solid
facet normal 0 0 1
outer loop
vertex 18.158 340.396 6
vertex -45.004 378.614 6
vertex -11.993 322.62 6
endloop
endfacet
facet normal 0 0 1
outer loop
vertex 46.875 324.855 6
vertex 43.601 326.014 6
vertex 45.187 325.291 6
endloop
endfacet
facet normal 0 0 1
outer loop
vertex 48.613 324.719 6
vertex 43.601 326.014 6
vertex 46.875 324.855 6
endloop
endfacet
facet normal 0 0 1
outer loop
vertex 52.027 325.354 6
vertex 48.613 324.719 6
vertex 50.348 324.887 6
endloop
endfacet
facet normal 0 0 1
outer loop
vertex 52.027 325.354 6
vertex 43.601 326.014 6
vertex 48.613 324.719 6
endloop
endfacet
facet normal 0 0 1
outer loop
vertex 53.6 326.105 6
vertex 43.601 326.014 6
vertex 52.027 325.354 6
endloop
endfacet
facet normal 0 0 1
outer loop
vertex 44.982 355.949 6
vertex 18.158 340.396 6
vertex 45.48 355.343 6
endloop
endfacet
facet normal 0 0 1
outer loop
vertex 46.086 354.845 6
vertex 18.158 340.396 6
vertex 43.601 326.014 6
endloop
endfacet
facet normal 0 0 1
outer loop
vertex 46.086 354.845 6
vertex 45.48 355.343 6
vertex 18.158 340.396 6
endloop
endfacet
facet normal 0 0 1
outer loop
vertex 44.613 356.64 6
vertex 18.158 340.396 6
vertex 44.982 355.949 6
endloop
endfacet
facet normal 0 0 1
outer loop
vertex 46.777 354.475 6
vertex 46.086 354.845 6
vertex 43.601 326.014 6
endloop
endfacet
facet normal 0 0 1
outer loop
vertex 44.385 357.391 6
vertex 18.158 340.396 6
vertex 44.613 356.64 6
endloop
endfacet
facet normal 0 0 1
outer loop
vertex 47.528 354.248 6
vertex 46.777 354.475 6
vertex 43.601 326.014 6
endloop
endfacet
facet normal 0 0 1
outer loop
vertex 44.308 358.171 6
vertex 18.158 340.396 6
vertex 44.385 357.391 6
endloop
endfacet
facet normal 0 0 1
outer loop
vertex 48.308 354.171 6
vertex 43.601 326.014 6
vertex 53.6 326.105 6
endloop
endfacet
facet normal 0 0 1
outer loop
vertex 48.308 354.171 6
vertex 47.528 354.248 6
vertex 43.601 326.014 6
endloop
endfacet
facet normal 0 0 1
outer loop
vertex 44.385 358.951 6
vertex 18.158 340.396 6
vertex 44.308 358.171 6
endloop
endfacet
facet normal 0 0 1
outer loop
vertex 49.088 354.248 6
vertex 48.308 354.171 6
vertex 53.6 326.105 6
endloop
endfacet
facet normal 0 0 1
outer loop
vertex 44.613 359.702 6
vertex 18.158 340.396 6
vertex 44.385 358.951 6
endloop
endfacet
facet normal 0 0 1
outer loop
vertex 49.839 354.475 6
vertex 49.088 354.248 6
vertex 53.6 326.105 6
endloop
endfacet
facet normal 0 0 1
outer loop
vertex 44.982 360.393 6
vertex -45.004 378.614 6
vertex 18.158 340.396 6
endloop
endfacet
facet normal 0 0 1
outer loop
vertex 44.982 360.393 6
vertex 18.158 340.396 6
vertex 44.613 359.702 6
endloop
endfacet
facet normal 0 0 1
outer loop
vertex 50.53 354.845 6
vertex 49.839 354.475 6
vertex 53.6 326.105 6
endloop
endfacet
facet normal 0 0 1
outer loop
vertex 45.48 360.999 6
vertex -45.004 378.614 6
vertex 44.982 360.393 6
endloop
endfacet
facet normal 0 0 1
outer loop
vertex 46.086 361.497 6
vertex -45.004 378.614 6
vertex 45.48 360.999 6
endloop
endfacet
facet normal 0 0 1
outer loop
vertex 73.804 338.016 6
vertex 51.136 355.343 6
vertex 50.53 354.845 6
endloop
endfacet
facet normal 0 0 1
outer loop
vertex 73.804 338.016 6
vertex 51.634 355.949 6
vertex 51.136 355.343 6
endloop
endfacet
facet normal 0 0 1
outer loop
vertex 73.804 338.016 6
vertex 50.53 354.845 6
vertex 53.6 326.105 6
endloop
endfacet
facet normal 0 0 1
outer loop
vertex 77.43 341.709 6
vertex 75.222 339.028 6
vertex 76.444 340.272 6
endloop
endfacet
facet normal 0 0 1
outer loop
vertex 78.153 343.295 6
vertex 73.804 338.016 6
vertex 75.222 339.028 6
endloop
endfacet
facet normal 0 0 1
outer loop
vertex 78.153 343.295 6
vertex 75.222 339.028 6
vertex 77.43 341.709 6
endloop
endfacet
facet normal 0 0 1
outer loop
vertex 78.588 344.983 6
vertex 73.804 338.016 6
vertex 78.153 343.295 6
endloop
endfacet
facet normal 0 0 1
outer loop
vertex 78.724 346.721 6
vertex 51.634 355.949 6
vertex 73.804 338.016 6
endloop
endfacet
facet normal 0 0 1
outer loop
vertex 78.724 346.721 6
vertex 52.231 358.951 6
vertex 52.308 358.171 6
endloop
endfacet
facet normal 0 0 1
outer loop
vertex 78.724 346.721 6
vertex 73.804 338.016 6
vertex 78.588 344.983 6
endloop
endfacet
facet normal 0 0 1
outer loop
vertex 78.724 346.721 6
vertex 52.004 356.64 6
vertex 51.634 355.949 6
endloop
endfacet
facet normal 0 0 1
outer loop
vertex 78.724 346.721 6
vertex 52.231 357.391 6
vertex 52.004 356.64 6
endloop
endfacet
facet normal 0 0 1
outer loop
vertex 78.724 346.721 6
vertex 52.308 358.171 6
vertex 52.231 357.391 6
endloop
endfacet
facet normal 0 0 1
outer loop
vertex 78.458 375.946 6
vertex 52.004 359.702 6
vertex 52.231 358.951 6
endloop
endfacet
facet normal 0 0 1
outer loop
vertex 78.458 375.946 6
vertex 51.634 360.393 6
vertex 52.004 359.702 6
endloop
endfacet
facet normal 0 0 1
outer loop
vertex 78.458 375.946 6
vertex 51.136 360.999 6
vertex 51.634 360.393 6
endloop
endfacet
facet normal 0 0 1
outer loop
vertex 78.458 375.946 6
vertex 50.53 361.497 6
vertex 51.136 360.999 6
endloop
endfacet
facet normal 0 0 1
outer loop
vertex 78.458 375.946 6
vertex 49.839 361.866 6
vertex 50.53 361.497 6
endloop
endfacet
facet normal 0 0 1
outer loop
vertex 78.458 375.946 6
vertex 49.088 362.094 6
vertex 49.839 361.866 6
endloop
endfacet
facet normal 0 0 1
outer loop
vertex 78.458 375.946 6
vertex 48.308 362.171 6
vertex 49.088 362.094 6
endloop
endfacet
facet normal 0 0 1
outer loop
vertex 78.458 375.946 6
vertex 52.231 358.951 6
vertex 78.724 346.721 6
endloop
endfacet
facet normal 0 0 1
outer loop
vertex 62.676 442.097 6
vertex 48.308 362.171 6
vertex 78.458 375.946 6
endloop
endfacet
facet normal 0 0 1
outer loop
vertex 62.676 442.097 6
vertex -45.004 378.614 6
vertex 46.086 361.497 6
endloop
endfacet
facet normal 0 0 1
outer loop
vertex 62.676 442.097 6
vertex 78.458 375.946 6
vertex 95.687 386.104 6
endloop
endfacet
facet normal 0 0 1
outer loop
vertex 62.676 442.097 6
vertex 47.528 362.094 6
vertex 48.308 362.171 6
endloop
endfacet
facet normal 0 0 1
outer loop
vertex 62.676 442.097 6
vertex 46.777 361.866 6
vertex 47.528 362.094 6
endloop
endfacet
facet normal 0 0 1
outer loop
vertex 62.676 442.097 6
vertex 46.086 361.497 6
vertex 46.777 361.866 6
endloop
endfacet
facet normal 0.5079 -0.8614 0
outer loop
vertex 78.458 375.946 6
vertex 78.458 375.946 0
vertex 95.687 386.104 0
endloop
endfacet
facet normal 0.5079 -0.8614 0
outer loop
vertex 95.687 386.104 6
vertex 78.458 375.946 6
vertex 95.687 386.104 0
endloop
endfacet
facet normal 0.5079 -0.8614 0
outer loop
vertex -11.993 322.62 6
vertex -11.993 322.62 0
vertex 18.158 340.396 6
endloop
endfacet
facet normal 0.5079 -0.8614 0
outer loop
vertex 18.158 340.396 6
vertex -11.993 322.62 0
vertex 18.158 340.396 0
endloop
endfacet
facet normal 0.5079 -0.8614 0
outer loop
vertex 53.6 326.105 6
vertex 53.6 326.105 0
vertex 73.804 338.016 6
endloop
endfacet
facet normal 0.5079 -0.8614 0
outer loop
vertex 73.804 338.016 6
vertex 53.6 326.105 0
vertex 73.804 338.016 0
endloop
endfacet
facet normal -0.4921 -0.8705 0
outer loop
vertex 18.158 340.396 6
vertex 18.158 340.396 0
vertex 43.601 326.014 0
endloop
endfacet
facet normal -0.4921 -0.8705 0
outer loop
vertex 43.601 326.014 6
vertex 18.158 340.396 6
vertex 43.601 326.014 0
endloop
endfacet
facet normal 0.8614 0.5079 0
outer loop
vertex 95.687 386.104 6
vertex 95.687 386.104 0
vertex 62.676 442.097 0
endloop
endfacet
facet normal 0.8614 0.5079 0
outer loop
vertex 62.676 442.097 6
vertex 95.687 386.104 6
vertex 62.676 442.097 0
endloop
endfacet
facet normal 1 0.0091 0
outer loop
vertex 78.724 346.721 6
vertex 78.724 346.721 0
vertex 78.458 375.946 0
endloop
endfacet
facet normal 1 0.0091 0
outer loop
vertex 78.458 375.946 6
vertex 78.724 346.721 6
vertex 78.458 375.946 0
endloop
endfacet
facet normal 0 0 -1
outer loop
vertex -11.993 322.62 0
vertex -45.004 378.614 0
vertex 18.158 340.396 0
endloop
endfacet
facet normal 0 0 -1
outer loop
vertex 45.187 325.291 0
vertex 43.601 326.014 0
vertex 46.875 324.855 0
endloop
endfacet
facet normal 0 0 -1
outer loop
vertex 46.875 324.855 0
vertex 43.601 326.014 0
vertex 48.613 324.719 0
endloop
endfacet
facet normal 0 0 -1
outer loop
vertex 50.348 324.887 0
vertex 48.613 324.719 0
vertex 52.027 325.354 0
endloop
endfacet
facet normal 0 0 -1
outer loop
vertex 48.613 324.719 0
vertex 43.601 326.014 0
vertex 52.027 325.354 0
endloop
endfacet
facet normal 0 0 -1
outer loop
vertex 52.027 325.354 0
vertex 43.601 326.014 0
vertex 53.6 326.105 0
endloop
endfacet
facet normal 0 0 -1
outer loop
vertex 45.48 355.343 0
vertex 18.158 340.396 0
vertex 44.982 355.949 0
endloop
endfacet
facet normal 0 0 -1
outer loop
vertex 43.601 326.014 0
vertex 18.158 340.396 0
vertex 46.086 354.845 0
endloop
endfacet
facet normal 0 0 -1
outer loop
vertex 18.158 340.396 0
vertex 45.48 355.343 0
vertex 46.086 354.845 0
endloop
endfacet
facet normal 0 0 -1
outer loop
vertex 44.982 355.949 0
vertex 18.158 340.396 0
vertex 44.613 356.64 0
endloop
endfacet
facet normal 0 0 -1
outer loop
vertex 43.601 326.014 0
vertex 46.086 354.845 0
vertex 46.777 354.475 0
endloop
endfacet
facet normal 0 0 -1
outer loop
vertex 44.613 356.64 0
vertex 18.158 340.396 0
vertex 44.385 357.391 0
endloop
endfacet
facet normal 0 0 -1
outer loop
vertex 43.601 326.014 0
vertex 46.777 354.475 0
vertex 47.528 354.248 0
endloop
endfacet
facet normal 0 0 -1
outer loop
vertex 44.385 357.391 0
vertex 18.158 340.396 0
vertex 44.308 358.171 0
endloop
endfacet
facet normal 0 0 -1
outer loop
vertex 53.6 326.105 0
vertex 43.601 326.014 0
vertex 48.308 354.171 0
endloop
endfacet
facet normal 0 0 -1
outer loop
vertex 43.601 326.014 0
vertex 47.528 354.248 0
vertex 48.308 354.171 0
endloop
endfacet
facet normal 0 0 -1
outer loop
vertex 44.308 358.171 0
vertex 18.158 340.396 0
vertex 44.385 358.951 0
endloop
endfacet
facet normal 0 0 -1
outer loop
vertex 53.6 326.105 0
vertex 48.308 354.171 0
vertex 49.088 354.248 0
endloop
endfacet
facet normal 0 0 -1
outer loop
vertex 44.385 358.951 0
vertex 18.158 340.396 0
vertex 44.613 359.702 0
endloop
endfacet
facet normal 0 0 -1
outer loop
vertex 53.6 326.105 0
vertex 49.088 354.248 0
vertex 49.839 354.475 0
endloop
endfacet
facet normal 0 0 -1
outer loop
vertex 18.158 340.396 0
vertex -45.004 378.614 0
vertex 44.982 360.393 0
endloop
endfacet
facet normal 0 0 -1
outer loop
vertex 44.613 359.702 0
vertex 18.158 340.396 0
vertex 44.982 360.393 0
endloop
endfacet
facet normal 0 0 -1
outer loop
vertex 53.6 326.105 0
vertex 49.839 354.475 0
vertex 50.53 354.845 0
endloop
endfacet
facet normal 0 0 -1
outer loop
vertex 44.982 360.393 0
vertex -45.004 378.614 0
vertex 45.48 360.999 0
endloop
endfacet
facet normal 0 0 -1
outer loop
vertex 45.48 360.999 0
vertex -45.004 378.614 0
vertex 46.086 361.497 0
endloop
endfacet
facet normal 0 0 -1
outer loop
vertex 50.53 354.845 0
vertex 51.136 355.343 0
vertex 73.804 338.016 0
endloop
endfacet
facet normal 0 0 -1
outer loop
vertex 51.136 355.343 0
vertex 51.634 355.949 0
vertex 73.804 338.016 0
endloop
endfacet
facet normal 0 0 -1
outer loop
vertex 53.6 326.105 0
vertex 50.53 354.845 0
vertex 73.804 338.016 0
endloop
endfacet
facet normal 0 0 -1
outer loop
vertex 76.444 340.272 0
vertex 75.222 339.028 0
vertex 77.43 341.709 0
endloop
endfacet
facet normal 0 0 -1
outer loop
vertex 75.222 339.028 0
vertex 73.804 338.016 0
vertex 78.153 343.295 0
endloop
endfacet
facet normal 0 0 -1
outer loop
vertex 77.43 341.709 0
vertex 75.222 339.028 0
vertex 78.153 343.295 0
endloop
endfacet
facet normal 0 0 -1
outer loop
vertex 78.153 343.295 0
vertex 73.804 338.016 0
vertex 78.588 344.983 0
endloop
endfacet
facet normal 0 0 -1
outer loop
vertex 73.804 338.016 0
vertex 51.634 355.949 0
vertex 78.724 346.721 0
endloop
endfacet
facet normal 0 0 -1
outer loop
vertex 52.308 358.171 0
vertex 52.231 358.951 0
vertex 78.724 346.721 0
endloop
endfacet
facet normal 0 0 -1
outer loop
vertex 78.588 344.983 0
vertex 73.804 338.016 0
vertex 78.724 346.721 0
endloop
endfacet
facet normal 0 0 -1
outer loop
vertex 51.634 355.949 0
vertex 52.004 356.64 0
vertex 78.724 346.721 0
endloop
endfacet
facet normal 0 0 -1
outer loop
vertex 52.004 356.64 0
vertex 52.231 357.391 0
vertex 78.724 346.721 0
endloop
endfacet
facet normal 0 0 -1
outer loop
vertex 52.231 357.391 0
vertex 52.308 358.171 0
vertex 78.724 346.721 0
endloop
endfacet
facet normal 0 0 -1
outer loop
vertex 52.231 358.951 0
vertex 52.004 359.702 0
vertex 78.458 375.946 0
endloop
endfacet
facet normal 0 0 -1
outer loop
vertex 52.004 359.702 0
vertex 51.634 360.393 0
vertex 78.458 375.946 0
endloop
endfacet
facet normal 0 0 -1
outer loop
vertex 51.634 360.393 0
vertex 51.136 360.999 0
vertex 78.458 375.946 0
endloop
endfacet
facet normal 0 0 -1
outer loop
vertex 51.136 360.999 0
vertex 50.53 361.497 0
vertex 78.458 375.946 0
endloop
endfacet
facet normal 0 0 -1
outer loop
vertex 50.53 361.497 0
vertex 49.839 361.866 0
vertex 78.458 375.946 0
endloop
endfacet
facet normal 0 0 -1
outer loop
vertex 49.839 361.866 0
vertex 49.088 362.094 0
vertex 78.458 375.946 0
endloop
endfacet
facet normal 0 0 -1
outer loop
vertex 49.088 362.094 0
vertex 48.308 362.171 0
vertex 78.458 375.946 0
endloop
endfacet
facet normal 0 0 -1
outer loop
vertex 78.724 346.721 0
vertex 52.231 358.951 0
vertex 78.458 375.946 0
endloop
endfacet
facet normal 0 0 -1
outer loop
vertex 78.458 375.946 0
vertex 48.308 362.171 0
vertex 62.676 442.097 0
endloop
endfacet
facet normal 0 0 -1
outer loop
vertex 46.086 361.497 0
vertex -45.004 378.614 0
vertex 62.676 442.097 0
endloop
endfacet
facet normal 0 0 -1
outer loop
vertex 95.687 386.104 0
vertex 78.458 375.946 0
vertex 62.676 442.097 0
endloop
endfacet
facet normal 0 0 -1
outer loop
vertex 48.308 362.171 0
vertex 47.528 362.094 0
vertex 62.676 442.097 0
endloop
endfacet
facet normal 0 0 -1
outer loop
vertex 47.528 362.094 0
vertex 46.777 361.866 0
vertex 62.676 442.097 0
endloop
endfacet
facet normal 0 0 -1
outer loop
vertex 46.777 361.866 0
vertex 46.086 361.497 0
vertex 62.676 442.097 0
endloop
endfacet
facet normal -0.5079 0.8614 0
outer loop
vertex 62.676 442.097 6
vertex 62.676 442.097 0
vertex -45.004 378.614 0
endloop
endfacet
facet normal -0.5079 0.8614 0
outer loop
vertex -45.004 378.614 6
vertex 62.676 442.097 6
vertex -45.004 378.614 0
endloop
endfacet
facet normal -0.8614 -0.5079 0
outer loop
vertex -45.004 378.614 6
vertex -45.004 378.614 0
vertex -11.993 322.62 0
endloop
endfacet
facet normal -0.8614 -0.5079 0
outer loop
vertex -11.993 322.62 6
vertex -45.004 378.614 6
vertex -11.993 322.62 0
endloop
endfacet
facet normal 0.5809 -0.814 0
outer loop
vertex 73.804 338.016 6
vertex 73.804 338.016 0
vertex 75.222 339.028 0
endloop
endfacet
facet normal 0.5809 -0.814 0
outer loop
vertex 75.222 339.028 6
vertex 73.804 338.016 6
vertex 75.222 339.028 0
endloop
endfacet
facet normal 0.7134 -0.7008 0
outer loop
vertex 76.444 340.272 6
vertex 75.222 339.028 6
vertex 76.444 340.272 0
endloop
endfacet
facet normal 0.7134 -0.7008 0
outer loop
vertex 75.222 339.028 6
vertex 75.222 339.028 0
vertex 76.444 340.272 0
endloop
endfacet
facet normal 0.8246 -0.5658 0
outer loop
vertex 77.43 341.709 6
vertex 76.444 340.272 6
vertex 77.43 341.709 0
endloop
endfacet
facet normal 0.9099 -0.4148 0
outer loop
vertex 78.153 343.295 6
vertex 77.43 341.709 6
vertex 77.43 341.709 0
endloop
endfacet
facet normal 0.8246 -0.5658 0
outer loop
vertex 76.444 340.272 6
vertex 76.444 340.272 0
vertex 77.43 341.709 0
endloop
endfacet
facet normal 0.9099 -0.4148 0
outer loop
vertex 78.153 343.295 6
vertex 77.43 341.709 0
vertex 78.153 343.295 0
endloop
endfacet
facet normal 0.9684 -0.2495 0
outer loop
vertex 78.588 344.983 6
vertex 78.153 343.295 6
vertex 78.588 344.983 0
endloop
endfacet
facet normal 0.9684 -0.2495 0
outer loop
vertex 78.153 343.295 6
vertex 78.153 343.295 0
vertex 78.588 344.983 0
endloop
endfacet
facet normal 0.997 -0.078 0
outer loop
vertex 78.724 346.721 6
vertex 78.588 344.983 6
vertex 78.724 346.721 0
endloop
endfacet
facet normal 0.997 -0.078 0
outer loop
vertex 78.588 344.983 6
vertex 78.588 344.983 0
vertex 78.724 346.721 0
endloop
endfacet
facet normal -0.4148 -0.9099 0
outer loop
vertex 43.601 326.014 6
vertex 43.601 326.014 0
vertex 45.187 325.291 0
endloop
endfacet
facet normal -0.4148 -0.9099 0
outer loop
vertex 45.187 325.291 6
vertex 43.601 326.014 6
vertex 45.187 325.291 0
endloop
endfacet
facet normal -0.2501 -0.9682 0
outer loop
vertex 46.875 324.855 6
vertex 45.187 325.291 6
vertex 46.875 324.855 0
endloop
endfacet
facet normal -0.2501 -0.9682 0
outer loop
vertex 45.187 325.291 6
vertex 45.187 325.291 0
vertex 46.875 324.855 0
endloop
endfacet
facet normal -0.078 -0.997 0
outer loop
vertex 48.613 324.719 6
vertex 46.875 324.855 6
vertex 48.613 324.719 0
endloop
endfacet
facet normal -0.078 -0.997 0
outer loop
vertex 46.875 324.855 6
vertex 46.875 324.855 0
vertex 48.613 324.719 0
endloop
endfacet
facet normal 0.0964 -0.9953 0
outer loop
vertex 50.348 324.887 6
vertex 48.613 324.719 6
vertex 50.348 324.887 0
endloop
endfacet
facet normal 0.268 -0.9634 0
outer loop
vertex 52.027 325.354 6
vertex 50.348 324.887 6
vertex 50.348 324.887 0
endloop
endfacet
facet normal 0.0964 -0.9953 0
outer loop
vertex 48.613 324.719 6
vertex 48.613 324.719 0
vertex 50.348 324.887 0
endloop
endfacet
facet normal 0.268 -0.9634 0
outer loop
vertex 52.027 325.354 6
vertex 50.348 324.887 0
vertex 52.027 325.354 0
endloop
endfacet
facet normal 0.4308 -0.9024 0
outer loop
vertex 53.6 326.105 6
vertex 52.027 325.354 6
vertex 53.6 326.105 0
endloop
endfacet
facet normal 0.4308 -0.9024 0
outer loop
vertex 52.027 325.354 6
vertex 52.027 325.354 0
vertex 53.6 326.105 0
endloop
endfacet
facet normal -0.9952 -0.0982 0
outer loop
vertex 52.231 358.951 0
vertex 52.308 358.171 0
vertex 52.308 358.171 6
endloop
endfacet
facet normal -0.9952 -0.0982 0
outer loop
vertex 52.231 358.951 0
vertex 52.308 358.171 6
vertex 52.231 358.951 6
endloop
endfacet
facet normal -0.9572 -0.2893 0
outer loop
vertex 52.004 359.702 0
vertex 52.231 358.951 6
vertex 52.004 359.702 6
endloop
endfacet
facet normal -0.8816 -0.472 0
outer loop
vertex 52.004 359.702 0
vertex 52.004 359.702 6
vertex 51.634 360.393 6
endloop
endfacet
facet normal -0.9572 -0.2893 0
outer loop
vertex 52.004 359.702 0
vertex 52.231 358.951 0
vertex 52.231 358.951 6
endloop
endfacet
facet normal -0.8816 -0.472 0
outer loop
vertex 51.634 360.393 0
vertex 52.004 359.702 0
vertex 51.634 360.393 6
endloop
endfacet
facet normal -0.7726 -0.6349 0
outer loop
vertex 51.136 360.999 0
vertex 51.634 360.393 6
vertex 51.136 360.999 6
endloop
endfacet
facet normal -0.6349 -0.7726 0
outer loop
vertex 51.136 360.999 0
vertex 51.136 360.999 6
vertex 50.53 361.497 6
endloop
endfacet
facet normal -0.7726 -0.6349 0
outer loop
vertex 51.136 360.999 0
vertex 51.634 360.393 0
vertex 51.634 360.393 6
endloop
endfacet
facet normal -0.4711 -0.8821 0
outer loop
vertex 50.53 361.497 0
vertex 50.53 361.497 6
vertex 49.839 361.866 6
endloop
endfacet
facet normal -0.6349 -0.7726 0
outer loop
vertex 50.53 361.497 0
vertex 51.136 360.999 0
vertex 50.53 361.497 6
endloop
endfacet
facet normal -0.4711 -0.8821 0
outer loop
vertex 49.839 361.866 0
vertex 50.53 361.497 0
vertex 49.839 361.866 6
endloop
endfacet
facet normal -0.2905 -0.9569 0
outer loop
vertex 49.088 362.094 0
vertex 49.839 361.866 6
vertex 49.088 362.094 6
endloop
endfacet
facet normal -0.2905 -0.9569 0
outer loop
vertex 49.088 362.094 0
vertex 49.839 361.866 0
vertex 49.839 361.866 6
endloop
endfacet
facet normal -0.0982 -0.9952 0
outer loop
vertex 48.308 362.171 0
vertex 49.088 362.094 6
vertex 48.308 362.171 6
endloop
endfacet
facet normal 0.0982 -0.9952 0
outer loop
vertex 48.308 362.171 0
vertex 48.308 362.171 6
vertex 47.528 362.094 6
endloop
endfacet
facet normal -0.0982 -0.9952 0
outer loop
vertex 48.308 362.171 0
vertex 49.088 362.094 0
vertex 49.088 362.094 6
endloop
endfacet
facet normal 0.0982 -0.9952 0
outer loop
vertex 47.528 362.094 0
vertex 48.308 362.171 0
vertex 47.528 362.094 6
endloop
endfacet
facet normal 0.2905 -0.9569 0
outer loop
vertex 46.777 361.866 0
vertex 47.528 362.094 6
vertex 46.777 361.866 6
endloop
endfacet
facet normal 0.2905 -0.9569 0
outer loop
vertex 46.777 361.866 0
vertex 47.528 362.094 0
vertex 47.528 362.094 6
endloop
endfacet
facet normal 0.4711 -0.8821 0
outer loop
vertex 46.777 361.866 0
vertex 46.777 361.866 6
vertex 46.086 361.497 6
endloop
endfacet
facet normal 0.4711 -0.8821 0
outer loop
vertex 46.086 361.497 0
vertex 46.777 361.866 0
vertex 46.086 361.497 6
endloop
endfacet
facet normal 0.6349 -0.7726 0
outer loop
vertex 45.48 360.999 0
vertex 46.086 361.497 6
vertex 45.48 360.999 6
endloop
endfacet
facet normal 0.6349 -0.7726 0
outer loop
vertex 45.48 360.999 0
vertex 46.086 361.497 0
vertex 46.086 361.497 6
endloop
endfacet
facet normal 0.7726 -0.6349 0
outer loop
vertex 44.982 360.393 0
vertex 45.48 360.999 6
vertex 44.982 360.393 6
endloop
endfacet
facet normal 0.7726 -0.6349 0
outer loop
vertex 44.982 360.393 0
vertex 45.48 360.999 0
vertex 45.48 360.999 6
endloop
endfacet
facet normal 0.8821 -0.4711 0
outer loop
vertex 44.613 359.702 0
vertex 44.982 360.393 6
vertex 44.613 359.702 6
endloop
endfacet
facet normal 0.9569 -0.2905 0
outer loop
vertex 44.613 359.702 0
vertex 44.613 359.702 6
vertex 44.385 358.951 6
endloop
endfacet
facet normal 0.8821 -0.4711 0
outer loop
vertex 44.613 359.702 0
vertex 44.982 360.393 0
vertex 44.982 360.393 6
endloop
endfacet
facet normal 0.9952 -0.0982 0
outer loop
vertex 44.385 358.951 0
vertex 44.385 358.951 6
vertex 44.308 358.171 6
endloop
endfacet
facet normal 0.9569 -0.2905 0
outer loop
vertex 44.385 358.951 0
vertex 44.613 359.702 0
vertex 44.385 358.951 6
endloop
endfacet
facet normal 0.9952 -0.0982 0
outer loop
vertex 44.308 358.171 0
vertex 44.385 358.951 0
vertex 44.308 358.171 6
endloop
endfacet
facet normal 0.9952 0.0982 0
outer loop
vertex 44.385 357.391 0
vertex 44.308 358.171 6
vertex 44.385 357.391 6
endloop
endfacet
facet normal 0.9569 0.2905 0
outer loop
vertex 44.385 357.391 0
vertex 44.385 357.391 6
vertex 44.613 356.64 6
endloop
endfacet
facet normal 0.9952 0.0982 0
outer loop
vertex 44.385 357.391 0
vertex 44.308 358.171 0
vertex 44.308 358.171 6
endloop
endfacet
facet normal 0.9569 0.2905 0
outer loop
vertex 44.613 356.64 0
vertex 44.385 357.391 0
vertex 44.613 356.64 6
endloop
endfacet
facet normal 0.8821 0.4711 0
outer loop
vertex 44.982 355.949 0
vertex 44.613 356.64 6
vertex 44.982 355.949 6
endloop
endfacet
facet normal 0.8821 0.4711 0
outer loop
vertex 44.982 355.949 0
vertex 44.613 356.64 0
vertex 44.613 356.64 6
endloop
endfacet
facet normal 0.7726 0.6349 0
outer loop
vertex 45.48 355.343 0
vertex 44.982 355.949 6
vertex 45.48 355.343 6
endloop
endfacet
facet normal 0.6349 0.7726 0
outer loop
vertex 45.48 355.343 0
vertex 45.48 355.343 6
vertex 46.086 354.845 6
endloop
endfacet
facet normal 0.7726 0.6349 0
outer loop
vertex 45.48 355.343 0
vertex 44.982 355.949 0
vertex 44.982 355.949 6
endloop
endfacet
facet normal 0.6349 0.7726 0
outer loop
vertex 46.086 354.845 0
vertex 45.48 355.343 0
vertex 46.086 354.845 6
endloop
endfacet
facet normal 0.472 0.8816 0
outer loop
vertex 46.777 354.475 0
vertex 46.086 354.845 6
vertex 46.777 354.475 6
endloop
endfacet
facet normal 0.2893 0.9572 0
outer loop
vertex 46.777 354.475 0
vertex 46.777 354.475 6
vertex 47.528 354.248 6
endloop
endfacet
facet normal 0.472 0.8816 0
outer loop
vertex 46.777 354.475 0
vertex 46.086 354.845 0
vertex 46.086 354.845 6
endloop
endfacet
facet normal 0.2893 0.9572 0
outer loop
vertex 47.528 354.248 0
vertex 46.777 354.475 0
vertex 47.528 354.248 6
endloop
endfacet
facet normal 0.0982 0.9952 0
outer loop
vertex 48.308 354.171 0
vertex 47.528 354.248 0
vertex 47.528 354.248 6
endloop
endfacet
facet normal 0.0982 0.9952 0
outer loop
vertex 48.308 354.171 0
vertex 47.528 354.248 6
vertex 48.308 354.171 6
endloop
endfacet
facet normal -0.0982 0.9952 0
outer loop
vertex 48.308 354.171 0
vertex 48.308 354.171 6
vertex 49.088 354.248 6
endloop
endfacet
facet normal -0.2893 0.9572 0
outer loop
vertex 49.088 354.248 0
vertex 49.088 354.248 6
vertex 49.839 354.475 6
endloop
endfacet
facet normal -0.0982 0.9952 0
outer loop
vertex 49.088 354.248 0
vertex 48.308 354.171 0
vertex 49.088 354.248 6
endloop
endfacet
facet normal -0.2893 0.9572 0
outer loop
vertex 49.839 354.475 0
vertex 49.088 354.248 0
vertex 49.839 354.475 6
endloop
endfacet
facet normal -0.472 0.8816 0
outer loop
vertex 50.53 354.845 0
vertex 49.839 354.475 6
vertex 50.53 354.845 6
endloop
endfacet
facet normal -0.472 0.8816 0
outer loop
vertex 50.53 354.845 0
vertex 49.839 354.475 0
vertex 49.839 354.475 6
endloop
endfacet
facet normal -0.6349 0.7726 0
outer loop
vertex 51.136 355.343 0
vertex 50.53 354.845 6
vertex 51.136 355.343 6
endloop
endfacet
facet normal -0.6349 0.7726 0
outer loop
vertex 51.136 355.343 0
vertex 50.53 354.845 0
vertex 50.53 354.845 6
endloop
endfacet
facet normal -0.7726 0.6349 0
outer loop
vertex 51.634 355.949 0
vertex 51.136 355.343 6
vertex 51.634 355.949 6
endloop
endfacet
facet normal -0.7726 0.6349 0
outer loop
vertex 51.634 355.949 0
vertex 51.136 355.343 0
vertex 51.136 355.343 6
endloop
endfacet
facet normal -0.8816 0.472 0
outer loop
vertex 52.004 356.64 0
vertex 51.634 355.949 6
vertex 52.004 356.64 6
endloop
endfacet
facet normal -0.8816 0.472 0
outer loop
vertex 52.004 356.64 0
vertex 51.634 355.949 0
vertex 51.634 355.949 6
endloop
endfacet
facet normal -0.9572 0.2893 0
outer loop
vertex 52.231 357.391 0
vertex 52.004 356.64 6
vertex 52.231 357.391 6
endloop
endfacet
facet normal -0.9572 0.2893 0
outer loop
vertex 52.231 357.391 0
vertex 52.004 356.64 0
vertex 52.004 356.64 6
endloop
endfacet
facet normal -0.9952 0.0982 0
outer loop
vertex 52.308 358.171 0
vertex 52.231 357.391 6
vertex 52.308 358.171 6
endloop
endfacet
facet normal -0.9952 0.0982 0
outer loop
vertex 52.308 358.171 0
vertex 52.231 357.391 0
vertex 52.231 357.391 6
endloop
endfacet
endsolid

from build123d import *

# Parameters (mm, degrees)
SKETCH1_R           = 4
BOSS_EXTRUDE1_DEPTH = 6


with BuildPart() as part:
    # Sketch1 → Boss-Extrude1 (new body)
    with BuildSketch(Plane.XY):
        with BuildLine():
            Line((95.687041803, 386.103563742), (62.675802399, 442.096939002))
            Line((62.675802399, 442.096939002), (-45.003765409, 378.613786303))
            Line((-45.003765409, 378.613786303), (-11.992526005, 322.620411043))
            Line((-11.992526005, 322.620411043), (18.157752981, 340.395693799))
            Line((18.157752981, 340.395693799), (43.600659694, 326.013529743))
            ThreePointArc((43.600659694, 326.013529743), (48.612652005, 324.719368889), (53.600245097, 326.104588867))
            Line((53.600245097, 326.104588867), (73.80351169, 338.015549175))
            ThreePointArc((73.80351169, 338.015549175), (77.430284022, 341.708981412), (78.724444877, 346.720973723))
            Line((78.724444877, 346.720973723), (78.458310954, 375.94625931))
            Line((78.458310954, 375.94625931), (95.687041803, 386.103563742))
        make_face()
        with Locations((48.308031967, 358.170976554)):
            Circle(SKETCH1_R, mode=Mode.SUBTRACT)
    extrude(amount=BOSS_EXTRUDE1_DEPTH)


solid = part.part
